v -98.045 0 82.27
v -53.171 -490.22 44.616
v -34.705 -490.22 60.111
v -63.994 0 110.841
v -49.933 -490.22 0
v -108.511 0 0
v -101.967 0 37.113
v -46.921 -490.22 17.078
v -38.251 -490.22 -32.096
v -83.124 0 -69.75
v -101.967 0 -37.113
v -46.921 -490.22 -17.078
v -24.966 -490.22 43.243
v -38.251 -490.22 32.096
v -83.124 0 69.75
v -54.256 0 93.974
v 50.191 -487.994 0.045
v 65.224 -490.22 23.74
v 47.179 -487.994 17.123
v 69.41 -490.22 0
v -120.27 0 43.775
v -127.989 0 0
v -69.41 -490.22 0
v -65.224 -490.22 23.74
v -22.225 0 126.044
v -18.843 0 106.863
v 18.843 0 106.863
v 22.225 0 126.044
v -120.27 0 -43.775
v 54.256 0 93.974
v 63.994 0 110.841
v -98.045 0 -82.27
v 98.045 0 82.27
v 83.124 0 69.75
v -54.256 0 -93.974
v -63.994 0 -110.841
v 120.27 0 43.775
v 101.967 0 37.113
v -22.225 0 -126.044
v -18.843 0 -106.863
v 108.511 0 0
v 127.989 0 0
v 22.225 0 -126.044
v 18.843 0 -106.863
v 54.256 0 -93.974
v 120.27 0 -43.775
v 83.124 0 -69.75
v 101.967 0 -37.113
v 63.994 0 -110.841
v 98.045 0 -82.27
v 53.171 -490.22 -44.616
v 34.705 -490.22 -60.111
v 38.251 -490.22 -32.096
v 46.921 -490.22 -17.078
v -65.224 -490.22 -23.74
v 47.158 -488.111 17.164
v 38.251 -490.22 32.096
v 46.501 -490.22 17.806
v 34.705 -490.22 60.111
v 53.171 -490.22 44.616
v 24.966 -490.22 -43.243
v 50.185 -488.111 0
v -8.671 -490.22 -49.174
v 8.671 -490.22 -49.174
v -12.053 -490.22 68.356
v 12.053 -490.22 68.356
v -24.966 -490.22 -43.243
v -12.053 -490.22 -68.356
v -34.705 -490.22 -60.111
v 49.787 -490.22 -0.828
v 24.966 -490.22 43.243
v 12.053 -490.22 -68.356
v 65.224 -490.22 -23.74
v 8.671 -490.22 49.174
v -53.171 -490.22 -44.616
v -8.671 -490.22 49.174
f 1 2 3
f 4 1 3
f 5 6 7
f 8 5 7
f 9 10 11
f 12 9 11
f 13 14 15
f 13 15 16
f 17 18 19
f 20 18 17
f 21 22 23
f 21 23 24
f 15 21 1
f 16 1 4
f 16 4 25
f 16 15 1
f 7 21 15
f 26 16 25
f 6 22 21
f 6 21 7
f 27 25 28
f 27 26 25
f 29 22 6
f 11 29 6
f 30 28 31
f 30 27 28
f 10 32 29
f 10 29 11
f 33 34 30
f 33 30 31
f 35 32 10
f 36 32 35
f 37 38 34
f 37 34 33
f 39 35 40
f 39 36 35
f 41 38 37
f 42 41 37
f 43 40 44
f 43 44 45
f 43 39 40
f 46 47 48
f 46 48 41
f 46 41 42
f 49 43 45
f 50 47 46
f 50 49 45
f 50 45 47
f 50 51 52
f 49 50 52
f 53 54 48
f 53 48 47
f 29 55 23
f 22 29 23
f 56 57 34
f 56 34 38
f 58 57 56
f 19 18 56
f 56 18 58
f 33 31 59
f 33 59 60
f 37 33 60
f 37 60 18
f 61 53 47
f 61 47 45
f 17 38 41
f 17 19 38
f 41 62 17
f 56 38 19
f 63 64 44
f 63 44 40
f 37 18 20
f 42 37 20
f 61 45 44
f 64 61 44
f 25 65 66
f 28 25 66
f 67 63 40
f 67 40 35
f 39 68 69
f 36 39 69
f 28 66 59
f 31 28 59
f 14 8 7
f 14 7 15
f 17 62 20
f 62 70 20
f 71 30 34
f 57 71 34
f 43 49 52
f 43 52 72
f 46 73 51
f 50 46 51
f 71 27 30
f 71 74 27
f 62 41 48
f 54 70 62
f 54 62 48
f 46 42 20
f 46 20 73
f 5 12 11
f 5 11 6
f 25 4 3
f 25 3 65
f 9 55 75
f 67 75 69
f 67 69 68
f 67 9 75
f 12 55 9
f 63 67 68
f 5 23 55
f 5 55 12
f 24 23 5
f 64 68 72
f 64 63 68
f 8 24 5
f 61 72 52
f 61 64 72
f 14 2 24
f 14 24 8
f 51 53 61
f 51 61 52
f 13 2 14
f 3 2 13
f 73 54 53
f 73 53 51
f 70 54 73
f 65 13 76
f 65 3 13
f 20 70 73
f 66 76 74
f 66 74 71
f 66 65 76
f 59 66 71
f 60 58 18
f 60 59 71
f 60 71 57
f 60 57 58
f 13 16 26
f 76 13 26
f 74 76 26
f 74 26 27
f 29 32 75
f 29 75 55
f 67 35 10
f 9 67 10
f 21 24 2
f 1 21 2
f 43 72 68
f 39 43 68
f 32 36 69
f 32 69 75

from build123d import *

# Parameters (mm, degrees)
LOFT1_DEPTH        = 508
LOFT1_DRAFT        = -6.7116474
SHELL1_T           = -19.05
SKETCH5_R          = 147.867108762
CUT_EXTRUDE1_DEPTH = 17.78
CUT_EXTRUDE2_DEPTH = 528.39436013
CUT_EXTRUDE2_TAPER = -20


# Read off the part's stored shape, not the designer's step: Loft1
with BuildPart() as part:
    # Loft1 outline → Loft1 (with draft: the straight prism first)
    with BuildSketch(Plane(origin=(0, -508, 0), x_dir=(1, 0, 0), z_dir=(0, 1, 0))):
        Polygon((33.642737163, -58.270930071), (51.543663709, -43.250269208), (63.227663709, -23.012987572), (67.285474325, 0), (63.227663709, 23.012987572), (51.543663709, 43.250269208), (33.642737163, 58.270930071), (11.684, 66.26325678), (-11.684, 66.26325678), (-33.642737163, 58.270930071), (-51.543663709, 43.250269208), (-63.227663709, 23.012987572), (-67.285474325, 0), (-63.227663709, -23.012987572), (-51.543663709, -43.250269208), (-33.642737163, -58.270930071), (-11.684, -66.26325678), (11.684, -66.26325678), align=None)
    extrude(amount=LOFT1_DEPTH)
    # Loft1: the draft: its side faces are tilted about the plane it starts from
    loft1_sides = [part.faces().sort_by_distance(p)[0] for p in [
        (42.593200436, -254, 50.76059964),
        (57.385663709, -254, 33.13162839),
        (65.256569017, -254, 11.506493786),
        (65.256569017, -254, -11.506493786),
        (57.385663709, -254, -33.13162839),
        (42.593200436, -254, -50.76059964),
        (22.663368581, -254, -62.267093426),
        (0, -254, -66.26325678),
        (-22.663368582, -254, -62.267093426),
        (-42.593200436, -254, -50.76059964),
        (-57.385663709, -254, -33.13162839),
        (-65.256569017, -254, -11.506493786),
        (-65.256569017, -254, 11.506493786),
        (-57.385663709, -254, 33.13162839),
        (-42.593200436, -254, 50.76059964),
        (-22.663368581, -254, 62.267093426),
        (0, -254, 66.26325678),
        (22.663368582, -254, 62.267093426),
    ]]
    draft(loft1_sides, Plane(origin=(0, -508, 0), x_dir=(1, 0, 0), z_dir=(0, 1, 0)), LOFT1_DRAFT)

    # Shell1
    shell1_openings = [part.faces().sort_by_distance(p)[0] for p in [
        (0, 0, 0),
        (0, -508, 0),
    ]]
    offset(amount=SHELL1_T, openings=shell1_openings, kind=Kind.INTERSECTION)

    # Sketch5 → Cut-Extrude1 (cut)
    with BuildSketch(Plane.XZ.offset(508)):
        Circle(SKETCH5_R)
    extrude(amount=-CUT_EXTRUDE1_DEPTH, mode=Mode.SUBTRACT)

    # Sketch6 → Cut-Extrude2 (cut, through all)
    with BuildSketch(Plane(origin=(-55.116718082, -475.589831727, -9.718564486), x_dir=(0.17364817766692822, 0, -0.9848077530122085), z_dir=(-0.11509707458405294, -0.9931469114771136, -0.020294719649782803))):
        Polygon((-12.052935, 125.180446117), (-8.67072745, 106.130446117), (8.67072745, 106.130446117), (12.052935, 125.180446117), align=None)
    extrude(amount=CUT_EXTRUDE2_DEPTH, taper=CUT_EXTRUDE2_TAPER, mode=Mode.SUBTRACT)


solid = part.part
